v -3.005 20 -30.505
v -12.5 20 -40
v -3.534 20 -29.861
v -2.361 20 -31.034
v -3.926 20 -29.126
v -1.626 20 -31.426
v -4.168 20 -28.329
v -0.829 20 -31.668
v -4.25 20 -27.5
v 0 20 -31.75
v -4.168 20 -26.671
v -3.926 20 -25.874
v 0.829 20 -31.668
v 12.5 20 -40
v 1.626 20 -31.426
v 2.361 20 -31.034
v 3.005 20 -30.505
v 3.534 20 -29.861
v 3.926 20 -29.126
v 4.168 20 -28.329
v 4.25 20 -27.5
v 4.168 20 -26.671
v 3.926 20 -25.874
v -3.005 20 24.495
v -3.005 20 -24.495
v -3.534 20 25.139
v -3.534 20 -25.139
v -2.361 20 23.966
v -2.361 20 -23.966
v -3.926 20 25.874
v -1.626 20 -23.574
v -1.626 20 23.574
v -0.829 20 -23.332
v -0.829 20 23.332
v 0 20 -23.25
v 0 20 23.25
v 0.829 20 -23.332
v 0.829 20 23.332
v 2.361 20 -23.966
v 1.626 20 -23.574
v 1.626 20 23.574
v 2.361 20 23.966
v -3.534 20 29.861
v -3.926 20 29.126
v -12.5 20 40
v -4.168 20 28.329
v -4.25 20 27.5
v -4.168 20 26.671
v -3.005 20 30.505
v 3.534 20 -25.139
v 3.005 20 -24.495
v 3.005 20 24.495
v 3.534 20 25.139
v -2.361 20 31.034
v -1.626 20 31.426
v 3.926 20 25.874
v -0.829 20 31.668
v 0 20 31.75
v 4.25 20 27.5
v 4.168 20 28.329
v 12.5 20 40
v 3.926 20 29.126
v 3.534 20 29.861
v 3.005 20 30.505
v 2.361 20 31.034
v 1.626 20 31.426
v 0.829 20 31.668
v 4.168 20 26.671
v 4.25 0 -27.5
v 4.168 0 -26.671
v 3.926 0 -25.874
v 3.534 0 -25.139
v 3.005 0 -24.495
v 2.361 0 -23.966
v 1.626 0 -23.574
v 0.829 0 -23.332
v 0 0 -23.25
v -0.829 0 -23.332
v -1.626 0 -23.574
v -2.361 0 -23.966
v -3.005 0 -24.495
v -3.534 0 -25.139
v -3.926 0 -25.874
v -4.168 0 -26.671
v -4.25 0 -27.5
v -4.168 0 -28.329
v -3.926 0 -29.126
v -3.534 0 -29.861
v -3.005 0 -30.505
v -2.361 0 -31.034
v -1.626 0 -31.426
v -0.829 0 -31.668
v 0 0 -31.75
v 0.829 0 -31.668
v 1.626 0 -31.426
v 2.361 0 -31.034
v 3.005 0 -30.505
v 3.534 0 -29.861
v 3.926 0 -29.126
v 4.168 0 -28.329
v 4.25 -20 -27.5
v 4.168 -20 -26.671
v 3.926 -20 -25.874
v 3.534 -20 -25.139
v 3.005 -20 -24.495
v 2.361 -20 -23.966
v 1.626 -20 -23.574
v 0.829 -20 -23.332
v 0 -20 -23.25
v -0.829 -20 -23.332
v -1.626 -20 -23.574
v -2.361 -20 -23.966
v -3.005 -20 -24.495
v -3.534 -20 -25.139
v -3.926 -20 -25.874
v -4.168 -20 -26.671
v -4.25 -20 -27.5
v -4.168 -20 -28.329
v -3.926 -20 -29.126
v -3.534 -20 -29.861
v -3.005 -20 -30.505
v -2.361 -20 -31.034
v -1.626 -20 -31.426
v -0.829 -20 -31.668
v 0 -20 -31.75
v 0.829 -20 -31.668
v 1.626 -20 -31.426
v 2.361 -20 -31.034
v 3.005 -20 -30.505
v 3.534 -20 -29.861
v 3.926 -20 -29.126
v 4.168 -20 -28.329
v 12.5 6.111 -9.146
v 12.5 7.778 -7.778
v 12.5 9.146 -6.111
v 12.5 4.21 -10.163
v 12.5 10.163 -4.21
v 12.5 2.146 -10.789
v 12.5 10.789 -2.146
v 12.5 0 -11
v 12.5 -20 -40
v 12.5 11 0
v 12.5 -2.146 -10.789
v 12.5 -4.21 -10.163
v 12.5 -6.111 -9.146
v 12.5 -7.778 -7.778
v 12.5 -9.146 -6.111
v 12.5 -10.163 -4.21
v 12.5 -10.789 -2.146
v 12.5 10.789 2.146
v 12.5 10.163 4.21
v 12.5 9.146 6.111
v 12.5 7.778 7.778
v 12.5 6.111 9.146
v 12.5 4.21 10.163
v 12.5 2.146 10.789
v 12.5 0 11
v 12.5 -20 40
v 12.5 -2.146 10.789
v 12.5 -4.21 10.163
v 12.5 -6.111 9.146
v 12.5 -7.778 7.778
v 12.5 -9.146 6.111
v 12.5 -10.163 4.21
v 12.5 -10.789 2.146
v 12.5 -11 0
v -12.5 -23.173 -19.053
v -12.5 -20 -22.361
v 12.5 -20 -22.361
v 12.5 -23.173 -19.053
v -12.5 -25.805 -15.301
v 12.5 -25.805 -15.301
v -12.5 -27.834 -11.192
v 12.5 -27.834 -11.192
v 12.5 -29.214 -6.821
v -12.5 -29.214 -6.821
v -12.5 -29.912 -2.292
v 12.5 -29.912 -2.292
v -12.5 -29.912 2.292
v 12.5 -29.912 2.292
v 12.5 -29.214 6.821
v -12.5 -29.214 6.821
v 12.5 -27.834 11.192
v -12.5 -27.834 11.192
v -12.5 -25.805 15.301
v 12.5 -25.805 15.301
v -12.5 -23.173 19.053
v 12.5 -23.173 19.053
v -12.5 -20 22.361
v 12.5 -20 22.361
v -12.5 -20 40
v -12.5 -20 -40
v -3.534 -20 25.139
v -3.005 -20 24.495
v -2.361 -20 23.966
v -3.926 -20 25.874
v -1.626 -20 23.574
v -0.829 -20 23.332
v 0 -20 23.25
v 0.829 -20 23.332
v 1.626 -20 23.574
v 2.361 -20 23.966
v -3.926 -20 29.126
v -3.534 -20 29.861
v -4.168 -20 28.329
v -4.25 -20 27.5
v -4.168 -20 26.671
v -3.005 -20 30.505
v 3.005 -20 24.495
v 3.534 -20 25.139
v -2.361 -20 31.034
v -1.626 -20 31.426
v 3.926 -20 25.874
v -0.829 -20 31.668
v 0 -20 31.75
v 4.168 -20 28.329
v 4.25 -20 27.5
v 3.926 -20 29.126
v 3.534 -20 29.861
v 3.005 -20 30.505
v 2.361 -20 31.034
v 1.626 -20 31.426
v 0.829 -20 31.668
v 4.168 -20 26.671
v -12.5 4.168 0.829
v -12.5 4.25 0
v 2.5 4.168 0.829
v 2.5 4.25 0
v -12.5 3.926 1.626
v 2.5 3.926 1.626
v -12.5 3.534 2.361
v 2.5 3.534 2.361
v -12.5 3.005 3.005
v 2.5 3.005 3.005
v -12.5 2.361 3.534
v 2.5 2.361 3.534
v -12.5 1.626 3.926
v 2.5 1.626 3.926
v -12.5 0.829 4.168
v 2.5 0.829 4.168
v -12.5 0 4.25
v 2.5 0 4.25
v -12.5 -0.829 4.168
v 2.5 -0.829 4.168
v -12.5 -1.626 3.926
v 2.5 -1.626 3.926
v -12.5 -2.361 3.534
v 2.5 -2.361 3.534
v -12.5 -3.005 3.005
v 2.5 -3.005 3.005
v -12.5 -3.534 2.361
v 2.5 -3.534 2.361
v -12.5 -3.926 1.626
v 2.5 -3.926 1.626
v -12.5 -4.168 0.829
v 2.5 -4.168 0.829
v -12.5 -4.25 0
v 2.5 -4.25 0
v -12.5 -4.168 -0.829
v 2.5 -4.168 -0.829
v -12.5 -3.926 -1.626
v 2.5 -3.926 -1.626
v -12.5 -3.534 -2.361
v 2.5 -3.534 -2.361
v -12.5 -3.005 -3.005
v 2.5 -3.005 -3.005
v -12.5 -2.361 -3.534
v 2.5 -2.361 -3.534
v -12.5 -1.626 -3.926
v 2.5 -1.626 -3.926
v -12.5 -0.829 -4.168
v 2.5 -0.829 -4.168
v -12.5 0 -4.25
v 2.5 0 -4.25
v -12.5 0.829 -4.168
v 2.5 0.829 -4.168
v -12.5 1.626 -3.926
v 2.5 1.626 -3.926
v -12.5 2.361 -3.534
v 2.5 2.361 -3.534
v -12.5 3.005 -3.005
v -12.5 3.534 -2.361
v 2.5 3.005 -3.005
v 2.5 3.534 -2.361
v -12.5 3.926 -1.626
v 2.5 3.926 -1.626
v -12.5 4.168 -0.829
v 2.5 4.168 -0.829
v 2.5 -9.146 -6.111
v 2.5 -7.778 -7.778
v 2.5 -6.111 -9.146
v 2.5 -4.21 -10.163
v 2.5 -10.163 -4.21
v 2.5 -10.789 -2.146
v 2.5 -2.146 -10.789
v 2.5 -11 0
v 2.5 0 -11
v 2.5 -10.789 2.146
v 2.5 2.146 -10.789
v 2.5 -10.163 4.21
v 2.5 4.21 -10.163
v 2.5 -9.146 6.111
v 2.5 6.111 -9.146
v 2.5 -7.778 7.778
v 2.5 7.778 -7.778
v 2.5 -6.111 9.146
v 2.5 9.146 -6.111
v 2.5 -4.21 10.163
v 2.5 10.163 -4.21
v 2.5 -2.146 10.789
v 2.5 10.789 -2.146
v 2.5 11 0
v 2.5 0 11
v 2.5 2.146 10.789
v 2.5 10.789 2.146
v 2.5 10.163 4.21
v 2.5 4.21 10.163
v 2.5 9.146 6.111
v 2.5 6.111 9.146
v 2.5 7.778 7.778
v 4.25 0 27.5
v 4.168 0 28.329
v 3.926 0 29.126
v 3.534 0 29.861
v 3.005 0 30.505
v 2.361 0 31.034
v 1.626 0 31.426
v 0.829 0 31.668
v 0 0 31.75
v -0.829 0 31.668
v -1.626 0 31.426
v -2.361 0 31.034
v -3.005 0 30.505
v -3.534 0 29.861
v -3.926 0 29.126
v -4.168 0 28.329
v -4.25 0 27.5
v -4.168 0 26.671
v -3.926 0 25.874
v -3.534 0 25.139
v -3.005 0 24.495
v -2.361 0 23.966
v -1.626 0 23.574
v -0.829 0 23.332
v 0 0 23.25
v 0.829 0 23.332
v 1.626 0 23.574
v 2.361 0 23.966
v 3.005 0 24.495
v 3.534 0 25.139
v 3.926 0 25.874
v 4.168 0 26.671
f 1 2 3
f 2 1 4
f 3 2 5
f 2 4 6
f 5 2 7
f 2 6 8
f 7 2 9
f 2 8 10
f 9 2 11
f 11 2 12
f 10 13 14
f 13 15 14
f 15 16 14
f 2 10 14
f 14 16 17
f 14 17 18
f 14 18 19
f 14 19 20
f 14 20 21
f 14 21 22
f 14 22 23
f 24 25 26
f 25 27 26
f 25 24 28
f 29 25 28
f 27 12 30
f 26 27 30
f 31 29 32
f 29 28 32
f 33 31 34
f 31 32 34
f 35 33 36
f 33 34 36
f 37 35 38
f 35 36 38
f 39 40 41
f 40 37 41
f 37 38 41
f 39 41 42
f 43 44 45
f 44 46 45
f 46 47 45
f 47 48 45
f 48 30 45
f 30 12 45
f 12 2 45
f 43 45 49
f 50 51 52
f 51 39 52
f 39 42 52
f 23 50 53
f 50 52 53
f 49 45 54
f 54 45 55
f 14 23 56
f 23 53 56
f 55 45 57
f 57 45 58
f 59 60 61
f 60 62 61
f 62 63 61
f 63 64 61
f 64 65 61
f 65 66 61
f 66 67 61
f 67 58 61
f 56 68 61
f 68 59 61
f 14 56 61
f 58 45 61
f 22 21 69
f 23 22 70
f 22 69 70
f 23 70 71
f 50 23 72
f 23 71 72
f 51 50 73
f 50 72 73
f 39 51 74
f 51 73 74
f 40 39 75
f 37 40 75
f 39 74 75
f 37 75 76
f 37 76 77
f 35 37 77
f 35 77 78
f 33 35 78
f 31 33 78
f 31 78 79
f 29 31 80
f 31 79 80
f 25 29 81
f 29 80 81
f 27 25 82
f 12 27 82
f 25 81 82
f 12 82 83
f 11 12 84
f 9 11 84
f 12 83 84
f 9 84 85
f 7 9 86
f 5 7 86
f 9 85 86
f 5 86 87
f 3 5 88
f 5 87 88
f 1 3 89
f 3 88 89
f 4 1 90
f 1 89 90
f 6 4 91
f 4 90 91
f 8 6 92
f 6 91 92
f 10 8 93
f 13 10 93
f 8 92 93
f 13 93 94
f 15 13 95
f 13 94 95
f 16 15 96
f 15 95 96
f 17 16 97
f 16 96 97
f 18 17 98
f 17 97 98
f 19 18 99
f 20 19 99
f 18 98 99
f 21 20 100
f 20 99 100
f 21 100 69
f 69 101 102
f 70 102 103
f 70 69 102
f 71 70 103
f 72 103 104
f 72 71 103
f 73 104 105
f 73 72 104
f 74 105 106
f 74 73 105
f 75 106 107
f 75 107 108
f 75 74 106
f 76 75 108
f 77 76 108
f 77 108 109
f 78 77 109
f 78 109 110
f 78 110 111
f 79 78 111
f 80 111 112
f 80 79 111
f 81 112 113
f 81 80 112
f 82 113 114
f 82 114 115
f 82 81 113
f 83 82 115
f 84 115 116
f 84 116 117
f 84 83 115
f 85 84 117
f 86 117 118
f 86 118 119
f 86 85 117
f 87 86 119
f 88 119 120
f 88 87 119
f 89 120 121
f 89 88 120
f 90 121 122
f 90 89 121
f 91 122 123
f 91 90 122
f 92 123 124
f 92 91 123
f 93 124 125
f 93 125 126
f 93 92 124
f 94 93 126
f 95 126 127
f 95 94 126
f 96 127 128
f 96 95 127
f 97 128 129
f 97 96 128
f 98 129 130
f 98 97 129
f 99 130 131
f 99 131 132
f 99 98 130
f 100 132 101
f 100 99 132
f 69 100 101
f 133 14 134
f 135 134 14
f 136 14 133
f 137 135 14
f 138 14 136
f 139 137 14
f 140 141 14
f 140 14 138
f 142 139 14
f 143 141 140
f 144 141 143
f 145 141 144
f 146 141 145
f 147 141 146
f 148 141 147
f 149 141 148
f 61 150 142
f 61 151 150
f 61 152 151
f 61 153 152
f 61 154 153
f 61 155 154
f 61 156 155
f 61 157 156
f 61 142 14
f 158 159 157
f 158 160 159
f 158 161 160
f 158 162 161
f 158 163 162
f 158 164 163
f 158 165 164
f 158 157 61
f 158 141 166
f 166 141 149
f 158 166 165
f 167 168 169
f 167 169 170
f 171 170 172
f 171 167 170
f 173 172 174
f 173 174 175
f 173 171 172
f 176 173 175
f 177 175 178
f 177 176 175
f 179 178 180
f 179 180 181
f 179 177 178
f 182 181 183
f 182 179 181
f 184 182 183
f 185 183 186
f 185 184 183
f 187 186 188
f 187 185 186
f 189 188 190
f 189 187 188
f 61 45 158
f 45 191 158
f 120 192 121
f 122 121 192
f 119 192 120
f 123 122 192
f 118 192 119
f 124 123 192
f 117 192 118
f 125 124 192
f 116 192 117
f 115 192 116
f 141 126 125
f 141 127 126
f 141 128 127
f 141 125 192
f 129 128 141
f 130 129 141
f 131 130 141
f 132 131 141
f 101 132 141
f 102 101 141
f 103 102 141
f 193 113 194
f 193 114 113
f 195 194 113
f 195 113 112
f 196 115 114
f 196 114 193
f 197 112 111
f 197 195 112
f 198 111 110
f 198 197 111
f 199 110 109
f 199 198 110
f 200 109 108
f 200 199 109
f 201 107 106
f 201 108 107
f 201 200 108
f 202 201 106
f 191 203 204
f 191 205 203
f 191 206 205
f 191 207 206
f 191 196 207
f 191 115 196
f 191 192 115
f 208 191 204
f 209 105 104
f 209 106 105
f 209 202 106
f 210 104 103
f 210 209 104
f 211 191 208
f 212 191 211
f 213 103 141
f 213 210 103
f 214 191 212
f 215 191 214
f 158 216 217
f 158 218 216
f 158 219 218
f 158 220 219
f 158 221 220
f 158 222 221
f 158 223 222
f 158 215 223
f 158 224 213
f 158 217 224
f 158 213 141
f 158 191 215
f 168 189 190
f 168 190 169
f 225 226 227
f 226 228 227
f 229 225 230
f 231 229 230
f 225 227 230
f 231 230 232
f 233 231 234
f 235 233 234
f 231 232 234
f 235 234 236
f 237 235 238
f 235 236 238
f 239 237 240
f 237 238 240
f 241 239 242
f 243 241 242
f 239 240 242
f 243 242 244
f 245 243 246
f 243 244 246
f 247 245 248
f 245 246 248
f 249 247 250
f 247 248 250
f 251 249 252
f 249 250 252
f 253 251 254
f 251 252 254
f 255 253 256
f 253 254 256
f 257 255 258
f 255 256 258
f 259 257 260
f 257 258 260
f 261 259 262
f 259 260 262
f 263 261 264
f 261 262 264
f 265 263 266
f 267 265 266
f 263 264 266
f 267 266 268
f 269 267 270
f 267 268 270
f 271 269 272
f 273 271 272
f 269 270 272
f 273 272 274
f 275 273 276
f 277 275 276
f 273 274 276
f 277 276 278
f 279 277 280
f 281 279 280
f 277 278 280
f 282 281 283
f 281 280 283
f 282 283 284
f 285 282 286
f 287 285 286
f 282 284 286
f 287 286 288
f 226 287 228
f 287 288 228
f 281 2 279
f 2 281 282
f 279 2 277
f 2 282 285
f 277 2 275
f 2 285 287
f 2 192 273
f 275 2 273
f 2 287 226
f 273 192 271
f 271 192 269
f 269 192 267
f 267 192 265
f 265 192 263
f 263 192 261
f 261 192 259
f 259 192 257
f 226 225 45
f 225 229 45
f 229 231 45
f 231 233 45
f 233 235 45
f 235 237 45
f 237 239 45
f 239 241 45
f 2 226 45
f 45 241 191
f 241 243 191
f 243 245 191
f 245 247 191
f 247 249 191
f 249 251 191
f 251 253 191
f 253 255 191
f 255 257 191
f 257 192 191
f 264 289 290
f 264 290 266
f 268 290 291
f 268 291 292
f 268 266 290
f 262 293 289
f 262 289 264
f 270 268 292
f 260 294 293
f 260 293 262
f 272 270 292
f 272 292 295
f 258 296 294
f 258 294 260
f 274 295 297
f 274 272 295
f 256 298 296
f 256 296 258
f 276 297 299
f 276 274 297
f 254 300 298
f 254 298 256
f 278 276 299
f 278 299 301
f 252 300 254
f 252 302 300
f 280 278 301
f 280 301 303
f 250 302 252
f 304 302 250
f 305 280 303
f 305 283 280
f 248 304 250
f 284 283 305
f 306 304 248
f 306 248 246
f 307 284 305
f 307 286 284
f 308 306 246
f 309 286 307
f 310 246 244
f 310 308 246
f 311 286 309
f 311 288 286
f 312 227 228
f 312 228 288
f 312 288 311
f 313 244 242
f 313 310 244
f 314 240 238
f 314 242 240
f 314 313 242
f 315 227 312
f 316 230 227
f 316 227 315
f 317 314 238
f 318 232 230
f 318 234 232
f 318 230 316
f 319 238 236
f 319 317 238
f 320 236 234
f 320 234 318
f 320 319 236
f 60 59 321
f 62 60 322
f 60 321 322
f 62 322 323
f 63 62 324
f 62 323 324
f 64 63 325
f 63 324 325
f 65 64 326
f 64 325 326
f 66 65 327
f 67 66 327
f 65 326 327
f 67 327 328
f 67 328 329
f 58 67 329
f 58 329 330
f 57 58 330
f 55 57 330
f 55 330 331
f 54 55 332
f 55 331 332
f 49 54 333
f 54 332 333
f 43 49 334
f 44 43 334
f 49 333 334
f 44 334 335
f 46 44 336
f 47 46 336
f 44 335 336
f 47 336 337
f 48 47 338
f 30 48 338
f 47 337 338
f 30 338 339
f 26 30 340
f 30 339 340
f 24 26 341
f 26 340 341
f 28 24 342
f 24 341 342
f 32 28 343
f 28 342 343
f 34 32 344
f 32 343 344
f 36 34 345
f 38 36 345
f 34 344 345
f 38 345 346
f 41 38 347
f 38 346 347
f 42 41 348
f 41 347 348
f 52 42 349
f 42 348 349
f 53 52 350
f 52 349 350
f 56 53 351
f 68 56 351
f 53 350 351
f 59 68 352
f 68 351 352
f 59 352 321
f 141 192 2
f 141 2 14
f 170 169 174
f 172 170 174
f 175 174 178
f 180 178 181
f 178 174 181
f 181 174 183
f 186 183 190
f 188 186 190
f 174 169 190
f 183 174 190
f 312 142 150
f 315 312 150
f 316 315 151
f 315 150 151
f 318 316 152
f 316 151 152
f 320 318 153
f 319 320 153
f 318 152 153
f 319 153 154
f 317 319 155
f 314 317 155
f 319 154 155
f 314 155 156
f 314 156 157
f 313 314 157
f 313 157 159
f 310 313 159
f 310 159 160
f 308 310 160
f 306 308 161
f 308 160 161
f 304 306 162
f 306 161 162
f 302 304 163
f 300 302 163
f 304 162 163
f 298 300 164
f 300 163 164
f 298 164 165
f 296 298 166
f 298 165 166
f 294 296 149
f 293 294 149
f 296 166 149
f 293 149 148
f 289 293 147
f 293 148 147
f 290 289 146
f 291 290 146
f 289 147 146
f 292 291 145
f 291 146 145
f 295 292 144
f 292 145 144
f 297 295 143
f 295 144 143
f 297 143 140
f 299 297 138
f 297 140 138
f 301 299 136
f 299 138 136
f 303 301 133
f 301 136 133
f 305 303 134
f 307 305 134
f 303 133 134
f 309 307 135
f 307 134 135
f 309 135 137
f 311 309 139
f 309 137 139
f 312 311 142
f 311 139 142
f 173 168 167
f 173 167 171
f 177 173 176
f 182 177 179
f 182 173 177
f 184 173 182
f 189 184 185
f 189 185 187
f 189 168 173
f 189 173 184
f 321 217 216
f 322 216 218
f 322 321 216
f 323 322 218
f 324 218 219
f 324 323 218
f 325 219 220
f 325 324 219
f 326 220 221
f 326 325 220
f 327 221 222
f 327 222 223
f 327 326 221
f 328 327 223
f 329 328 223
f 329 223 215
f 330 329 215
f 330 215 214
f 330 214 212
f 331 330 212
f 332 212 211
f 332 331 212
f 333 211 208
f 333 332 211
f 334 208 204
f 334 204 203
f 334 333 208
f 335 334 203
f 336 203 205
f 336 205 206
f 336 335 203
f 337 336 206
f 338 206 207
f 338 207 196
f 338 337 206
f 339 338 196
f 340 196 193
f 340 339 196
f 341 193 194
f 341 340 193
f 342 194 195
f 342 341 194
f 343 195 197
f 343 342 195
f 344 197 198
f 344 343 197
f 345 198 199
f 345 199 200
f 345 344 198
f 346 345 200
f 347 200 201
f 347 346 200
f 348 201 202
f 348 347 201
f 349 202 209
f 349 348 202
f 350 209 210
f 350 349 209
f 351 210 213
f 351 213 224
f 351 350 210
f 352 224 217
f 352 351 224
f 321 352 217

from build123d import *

# Parameters (mm, degrees)
F0_W          = 25
F0_H          = 80
F0_R          = 4.25
F1_DEPTH      = 20
F1_DEPTH_BACK = 20
F2_R          = 4.25
F3_DEPTH      = 12.5
F4_R          = 11
F5_DEPTH      = 10
F6_R          = 4.25
F7_DEPTH      = 25
F9_DEPTH      = 25


with BuildPart() as f1:
    # F0 (on Front) → F1 (new body, two sides)
    with BuildSketch(Plane.XZ) as f1_sk:
        Rectangle(F0_W, F0_H)
        with Locations((0, -27.5)):
            Circle(F0_R, mode=Mode.SUBTRACT)
        with Locations((0, 27.5)):
            Circle(F0_R, mode=Mode.SUBTRACT)
    extrude(amount=F1_DEPTH)
    extrude(f1_sk.sketch, amount=-F1_DEPTH_BACK)

    # F2 (on Right) → F3 (cut, through all)
    with BuildSketch(Plane.YZ):
        Circle(F2_R)
    extrude(amount=-F3_DEPTH, mode=Mode.SUBTRACT)

    # F4 (on face) → F5 (cut)
    with BuildSketch(Plane.YZ.offset(12.5)):
        Circle(F4_R)
    extrude(amount=-F5_DEPTH, mode=Mode.SUBTRACT)

    # F6 (on face) → F7 (cut)
    with BuildSketch(Plane.YZ.offset(12.5)):
        Circle(F6_R)
    extrude(amount=-F7_DEPTH, mode=Mode.SUBTRACT)


with BuildPart() as f9:
    # F8 (on face) → F9 (new body)
    with BuildSketch(Plane(origin=(-12.5, 0, 0), x_dir=(0, -1, 0), z_dir=(-1, 0, 0))):
        with BuildLine():
            Line((20, 22.3606797751), (20, -22.3606797749))
            ThreePointArc((20, -22.3606797749), (30, 1e-10), (20, 22.3606797751))
        make_face()
    extrude(amount=-F9_DEPTH)


solid = Compound([f1.part, f9.part])
